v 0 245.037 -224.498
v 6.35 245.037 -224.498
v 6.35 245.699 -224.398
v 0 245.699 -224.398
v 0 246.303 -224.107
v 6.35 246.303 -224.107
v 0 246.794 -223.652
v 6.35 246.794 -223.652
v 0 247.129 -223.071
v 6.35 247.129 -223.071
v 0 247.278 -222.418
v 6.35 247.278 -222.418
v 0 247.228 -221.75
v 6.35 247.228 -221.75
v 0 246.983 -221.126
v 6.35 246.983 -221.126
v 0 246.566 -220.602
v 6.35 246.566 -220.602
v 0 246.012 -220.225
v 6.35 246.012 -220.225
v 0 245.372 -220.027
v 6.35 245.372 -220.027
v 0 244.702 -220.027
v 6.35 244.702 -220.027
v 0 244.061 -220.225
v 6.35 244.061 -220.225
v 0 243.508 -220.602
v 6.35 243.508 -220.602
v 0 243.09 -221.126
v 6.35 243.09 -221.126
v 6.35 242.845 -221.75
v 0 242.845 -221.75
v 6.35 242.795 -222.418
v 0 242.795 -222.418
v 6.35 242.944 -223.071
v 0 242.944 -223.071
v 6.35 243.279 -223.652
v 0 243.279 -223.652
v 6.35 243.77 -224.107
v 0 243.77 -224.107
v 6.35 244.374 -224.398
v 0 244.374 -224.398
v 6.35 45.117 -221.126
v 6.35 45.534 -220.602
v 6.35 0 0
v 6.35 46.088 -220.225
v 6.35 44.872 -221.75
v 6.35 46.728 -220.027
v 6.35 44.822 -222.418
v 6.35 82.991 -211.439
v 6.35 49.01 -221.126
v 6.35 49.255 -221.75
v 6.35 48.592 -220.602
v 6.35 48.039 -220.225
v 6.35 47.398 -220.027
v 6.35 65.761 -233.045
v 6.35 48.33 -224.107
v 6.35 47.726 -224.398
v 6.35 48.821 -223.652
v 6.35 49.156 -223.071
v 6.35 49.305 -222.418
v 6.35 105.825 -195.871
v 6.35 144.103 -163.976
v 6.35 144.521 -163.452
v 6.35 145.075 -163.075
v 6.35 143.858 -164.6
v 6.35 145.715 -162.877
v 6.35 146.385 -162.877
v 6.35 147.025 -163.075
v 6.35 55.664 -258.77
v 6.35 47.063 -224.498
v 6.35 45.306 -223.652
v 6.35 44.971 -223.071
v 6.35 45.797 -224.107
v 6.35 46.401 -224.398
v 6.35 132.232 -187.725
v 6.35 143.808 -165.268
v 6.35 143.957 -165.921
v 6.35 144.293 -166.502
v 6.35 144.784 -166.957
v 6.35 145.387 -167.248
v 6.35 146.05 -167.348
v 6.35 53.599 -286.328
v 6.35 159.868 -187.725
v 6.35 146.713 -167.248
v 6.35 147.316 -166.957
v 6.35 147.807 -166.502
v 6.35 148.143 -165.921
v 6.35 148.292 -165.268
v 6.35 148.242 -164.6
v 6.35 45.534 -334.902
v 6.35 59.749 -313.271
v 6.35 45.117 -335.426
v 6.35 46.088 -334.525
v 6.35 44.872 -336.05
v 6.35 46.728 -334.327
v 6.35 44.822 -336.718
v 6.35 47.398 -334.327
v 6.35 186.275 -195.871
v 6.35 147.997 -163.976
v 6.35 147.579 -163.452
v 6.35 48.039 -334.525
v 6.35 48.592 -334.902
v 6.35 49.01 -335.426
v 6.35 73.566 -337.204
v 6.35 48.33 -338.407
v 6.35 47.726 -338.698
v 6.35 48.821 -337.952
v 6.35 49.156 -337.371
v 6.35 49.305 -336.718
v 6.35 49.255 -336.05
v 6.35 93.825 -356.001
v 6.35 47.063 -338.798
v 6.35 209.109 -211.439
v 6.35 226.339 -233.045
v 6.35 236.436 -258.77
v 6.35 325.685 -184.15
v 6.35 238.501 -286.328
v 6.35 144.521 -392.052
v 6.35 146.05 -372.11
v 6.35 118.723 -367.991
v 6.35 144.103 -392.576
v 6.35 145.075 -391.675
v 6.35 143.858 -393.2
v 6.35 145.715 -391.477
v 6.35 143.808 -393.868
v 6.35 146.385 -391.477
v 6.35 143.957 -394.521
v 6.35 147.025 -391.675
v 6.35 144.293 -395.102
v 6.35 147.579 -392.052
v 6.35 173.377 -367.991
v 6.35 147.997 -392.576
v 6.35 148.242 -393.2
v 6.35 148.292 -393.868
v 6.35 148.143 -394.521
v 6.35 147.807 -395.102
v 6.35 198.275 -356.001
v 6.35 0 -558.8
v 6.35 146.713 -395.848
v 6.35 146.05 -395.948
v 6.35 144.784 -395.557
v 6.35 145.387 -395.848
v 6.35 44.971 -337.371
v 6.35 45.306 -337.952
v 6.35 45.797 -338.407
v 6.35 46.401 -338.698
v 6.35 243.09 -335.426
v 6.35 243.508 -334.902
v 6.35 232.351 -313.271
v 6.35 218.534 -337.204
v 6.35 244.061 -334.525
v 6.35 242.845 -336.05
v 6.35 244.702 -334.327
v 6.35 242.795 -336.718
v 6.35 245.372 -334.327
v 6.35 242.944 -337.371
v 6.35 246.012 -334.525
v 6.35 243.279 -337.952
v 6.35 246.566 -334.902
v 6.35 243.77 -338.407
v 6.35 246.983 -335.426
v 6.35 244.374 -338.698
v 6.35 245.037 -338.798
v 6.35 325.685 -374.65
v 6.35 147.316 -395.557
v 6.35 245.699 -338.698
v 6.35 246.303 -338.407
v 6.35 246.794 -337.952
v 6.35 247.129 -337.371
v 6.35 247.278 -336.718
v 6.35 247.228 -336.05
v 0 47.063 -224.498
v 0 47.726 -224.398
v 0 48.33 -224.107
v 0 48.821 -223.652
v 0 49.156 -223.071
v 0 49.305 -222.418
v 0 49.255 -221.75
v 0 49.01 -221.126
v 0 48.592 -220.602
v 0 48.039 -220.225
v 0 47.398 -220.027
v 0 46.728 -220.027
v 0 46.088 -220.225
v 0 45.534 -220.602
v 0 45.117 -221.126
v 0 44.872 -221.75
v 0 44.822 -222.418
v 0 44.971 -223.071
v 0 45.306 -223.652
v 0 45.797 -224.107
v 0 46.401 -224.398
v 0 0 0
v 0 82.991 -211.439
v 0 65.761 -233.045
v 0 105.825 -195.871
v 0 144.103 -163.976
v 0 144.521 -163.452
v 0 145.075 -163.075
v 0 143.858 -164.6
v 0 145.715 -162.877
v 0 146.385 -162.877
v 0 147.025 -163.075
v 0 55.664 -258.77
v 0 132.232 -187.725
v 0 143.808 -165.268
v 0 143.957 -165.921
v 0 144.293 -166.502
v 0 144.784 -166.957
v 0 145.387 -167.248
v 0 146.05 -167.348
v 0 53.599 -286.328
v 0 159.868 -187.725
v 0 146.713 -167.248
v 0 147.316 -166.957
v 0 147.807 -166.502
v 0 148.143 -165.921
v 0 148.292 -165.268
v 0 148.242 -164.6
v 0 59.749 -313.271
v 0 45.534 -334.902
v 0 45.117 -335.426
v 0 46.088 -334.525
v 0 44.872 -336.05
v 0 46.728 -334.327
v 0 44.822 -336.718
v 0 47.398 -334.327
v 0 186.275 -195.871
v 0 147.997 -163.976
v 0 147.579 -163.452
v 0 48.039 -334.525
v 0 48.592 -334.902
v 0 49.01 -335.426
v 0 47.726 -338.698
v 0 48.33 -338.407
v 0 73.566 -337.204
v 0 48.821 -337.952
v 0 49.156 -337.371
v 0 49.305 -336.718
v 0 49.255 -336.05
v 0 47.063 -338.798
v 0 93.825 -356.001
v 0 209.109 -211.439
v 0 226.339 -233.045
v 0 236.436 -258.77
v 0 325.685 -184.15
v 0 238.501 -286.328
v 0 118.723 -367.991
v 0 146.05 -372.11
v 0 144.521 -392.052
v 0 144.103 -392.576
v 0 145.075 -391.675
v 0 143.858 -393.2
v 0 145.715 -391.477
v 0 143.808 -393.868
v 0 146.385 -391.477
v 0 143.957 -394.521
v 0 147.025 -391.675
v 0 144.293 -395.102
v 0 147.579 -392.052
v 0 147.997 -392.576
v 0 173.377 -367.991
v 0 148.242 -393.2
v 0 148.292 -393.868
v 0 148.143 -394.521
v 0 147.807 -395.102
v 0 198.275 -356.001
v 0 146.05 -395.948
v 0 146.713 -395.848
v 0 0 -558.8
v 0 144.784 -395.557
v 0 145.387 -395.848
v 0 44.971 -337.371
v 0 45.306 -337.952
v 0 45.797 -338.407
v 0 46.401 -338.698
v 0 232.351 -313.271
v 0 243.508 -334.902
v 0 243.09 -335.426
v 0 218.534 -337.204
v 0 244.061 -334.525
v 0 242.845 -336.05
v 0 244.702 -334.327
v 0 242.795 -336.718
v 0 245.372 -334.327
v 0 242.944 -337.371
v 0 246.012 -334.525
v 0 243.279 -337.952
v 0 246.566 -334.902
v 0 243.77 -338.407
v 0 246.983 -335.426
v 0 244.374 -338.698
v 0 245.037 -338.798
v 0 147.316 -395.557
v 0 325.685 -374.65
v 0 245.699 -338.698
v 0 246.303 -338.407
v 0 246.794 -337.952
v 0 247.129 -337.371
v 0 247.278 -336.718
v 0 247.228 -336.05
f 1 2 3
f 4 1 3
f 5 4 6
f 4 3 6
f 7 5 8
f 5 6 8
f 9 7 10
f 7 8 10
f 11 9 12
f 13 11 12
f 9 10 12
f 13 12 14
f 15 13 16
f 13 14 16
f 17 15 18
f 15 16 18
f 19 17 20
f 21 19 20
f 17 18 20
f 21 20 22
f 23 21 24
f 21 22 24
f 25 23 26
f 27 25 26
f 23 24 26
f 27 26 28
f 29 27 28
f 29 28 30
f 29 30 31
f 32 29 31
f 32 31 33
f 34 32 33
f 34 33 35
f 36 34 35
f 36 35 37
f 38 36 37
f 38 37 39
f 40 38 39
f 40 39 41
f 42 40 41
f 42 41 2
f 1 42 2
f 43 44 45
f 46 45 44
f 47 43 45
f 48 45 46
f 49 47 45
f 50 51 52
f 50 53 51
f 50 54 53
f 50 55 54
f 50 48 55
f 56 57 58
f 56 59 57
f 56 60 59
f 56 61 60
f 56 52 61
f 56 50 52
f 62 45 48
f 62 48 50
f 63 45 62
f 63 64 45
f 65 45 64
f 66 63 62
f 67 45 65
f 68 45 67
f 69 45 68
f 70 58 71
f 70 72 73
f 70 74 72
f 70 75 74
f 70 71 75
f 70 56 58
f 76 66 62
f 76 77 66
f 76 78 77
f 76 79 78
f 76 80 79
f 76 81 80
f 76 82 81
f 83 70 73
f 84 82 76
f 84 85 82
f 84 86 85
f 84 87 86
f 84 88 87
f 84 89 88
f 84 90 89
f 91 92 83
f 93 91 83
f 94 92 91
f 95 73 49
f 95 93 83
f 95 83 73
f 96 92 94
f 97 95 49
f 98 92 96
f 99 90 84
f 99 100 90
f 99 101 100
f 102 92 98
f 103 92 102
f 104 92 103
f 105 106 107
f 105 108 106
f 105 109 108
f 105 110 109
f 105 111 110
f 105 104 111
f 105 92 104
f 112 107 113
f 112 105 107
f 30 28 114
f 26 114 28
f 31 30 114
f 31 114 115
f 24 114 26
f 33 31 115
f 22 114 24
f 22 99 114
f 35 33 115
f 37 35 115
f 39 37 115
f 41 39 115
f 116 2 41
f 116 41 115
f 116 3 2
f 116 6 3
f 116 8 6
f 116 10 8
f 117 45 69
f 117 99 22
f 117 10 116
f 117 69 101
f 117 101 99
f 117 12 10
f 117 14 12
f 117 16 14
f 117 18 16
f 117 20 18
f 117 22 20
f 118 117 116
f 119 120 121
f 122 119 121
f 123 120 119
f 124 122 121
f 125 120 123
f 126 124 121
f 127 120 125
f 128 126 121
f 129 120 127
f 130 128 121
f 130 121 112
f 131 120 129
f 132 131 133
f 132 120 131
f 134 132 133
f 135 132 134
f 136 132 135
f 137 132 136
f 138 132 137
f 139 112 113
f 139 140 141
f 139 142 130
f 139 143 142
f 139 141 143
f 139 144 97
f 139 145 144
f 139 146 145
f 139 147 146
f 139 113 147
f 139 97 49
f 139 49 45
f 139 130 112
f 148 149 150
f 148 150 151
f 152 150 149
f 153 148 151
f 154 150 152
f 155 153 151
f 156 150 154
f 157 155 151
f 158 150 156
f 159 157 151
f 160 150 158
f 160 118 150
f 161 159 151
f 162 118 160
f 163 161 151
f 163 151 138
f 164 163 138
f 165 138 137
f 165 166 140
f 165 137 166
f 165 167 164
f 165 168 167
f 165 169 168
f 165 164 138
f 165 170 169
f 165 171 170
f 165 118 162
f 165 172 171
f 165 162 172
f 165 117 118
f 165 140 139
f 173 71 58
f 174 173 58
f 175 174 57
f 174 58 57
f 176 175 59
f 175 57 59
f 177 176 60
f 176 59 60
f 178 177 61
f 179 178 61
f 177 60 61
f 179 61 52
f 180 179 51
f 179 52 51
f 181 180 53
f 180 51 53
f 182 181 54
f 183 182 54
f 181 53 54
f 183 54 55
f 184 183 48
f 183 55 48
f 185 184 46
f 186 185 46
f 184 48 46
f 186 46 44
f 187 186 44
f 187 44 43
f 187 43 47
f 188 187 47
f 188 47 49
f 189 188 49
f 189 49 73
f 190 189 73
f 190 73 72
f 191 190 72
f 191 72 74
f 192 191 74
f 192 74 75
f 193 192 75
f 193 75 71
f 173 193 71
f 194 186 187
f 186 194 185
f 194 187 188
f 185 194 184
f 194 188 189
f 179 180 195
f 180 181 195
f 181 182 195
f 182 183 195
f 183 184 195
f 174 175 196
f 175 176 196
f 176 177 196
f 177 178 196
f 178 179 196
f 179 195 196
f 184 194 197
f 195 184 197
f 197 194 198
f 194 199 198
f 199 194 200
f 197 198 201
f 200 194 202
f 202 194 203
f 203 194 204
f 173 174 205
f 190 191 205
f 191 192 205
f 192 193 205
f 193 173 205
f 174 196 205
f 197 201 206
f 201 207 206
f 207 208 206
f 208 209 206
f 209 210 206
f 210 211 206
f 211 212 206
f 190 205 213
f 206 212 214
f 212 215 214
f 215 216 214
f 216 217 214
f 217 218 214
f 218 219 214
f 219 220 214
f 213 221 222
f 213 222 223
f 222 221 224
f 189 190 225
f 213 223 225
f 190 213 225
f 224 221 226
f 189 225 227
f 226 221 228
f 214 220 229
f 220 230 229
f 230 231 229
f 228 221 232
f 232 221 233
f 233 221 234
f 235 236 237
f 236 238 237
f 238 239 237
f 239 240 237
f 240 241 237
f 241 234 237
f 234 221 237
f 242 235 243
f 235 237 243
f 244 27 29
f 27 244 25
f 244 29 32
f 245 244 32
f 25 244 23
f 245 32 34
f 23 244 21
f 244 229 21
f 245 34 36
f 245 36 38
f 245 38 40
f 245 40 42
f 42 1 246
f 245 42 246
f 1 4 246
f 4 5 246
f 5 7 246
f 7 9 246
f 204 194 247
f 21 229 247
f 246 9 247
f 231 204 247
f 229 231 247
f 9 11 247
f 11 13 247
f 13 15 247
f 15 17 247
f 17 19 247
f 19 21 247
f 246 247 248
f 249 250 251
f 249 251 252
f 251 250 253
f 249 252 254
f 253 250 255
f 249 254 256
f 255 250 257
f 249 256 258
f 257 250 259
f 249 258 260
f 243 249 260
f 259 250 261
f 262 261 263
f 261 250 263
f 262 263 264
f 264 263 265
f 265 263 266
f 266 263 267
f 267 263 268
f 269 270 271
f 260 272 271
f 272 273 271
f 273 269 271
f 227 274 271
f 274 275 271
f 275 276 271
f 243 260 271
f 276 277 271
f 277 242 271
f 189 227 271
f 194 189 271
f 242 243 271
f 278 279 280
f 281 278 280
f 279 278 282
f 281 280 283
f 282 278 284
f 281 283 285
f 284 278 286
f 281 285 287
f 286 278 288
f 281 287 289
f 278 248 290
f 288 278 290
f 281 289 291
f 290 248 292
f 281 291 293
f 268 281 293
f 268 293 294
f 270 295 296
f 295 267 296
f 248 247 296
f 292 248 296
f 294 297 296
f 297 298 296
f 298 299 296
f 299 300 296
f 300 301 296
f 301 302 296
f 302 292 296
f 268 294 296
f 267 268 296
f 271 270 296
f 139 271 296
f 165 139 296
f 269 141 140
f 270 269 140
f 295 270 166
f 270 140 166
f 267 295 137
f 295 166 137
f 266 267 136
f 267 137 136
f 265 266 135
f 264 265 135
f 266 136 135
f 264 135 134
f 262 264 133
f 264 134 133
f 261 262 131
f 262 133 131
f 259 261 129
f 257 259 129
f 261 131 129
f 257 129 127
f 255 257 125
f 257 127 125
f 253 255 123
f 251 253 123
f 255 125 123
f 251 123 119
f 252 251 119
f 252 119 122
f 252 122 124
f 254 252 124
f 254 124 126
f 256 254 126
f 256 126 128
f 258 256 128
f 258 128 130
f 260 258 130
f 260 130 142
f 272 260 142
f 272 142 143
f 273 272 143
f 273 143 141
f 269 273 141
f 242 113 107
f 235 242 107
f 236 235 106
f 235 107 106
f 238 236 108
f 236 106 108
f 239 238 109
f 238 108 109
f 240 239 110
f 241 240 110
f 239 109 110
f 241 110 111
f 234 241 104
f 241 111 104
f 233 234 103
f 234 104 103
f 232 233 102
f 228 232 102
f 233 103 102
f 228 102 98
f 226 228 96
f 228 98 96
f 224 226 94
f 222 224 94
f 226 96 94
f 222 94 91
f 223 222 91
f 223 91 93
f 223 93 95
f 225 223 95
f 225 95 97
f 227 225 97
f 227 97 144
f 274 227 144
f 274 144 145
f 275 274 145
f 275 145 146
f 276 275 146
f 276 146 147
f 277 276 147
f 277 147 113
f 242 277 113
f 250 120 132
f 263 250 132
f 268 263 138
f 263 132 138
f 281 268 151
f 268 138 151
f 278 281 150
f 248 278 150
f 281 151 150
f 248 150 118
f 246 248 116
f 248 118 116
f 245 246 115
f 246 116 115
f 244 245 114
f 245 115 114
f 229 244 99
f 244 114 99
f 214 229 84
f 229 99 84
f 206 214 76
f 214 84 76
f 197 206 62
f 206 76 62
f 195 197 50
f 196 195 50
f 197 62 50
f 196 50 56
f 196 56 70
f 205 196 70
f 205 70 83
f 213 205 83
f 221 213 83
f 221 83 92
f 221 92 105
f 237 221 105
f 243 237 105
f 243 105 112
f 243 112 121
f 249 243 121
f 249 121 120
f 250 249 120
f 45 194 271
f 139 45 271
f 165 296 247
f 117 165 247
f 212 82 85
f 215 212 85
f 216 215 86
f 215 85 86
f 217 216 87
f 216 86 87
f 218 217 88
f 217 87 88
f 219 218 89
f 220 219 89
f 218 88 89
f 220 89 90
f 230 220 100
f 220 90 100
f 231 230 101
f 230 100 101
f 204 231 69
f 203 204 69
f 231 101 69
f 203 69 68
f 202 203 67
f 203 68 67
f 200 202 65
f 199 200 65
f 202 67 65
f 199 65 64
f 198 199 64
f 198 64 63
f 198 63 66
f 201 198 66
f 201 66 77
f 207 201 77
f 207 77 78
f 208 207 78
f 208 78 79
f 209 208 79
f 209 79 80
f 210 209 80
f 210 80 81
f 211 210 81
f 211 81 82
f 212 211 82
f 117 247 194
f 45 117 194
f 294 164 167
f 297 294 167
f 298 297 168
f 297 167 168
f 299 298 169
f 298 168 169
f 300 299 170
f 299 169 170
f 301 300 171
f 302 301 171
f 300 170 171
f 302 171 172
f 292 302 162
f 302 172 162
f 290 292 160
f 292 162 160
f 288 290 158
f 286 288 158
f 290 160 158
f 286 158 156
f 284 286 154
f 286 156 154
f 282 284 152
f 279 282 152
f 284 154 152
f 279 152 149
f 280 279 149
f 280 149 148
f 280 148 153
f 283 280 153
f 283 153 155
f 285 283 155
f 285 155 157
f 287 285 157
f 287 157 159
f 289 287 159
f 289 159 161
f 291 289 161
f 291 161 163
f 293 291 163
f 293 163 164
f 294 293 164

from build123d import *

# Parameters (mm, degrees)
BOSS_EXTRUDE1_DEPTH       = 6.35
SKETCH2_R                 = 92.71
CUT_EXTRUDE1_DEPTH        = 7.35
F_8_CLEARANCE_HOLE1_D     = 4.4958
F_8_CLEARANCE_HOLE1_DEPTH = 25.4
F_8_CLEARANCE_HOLE1_TIP   = 1.350674586


with BuildPart() as part:
    # Sketch1 → Boss-Extrude1 (new body)
    with BuildSketch(Plane(origin=(0, 0, 0), x_dir=(0, 0, -1), z_dir=(1, 0, 0))):
        Polygon((0, 0), (558.8, 0), (374.65, 325.68545203), (184.15, 325.68545203), align=None)
    extrude(amount=BOSS_EXTRUDE1_DEPTH)

    # Sketch2 → Cut-Extrude1 (cut, through all)
    with BuildSketch(Plane(origin=(6.35, 0, 0), x_dir=(0, 0, -1), z_dir=(1, 0, 0))):
        with Locations((279.4, 146.05)):
            Circle(SKETCH2_R)
    extrude(amount=-CUT_EXTRUDE1_DEPTH, mode=Mode.SUBTRACT)

    # #8 Clearance Hole1
    with Locations(Plane.ZY):
        with Locations((-336.55, 245.036703653), (-222.25, 245.036703653), (-165.1, 146.05), (-222.25, 47.063296347), (-336.55, 47.063296347), (-393.7, 146.05)):
            Hole(F_8_CLEARANCE_HOLE1_D / 2, depth=F_8_CLEARANCE_HOLE1_DEPTH)
            with Locations((0, 0, -(F_8_CLEARANCE_HOLE1_DEPTH + F_8_CLEARANCE_HOLE1_TIP / 2))):  # 118° drill point
                Cone(0, F_8_CLEARANCE_HOLE1_D / 2, F_8_CLEARANCE_HOLE1_TIP, mode=Mode.SUBTRACT)


solid = part.part
